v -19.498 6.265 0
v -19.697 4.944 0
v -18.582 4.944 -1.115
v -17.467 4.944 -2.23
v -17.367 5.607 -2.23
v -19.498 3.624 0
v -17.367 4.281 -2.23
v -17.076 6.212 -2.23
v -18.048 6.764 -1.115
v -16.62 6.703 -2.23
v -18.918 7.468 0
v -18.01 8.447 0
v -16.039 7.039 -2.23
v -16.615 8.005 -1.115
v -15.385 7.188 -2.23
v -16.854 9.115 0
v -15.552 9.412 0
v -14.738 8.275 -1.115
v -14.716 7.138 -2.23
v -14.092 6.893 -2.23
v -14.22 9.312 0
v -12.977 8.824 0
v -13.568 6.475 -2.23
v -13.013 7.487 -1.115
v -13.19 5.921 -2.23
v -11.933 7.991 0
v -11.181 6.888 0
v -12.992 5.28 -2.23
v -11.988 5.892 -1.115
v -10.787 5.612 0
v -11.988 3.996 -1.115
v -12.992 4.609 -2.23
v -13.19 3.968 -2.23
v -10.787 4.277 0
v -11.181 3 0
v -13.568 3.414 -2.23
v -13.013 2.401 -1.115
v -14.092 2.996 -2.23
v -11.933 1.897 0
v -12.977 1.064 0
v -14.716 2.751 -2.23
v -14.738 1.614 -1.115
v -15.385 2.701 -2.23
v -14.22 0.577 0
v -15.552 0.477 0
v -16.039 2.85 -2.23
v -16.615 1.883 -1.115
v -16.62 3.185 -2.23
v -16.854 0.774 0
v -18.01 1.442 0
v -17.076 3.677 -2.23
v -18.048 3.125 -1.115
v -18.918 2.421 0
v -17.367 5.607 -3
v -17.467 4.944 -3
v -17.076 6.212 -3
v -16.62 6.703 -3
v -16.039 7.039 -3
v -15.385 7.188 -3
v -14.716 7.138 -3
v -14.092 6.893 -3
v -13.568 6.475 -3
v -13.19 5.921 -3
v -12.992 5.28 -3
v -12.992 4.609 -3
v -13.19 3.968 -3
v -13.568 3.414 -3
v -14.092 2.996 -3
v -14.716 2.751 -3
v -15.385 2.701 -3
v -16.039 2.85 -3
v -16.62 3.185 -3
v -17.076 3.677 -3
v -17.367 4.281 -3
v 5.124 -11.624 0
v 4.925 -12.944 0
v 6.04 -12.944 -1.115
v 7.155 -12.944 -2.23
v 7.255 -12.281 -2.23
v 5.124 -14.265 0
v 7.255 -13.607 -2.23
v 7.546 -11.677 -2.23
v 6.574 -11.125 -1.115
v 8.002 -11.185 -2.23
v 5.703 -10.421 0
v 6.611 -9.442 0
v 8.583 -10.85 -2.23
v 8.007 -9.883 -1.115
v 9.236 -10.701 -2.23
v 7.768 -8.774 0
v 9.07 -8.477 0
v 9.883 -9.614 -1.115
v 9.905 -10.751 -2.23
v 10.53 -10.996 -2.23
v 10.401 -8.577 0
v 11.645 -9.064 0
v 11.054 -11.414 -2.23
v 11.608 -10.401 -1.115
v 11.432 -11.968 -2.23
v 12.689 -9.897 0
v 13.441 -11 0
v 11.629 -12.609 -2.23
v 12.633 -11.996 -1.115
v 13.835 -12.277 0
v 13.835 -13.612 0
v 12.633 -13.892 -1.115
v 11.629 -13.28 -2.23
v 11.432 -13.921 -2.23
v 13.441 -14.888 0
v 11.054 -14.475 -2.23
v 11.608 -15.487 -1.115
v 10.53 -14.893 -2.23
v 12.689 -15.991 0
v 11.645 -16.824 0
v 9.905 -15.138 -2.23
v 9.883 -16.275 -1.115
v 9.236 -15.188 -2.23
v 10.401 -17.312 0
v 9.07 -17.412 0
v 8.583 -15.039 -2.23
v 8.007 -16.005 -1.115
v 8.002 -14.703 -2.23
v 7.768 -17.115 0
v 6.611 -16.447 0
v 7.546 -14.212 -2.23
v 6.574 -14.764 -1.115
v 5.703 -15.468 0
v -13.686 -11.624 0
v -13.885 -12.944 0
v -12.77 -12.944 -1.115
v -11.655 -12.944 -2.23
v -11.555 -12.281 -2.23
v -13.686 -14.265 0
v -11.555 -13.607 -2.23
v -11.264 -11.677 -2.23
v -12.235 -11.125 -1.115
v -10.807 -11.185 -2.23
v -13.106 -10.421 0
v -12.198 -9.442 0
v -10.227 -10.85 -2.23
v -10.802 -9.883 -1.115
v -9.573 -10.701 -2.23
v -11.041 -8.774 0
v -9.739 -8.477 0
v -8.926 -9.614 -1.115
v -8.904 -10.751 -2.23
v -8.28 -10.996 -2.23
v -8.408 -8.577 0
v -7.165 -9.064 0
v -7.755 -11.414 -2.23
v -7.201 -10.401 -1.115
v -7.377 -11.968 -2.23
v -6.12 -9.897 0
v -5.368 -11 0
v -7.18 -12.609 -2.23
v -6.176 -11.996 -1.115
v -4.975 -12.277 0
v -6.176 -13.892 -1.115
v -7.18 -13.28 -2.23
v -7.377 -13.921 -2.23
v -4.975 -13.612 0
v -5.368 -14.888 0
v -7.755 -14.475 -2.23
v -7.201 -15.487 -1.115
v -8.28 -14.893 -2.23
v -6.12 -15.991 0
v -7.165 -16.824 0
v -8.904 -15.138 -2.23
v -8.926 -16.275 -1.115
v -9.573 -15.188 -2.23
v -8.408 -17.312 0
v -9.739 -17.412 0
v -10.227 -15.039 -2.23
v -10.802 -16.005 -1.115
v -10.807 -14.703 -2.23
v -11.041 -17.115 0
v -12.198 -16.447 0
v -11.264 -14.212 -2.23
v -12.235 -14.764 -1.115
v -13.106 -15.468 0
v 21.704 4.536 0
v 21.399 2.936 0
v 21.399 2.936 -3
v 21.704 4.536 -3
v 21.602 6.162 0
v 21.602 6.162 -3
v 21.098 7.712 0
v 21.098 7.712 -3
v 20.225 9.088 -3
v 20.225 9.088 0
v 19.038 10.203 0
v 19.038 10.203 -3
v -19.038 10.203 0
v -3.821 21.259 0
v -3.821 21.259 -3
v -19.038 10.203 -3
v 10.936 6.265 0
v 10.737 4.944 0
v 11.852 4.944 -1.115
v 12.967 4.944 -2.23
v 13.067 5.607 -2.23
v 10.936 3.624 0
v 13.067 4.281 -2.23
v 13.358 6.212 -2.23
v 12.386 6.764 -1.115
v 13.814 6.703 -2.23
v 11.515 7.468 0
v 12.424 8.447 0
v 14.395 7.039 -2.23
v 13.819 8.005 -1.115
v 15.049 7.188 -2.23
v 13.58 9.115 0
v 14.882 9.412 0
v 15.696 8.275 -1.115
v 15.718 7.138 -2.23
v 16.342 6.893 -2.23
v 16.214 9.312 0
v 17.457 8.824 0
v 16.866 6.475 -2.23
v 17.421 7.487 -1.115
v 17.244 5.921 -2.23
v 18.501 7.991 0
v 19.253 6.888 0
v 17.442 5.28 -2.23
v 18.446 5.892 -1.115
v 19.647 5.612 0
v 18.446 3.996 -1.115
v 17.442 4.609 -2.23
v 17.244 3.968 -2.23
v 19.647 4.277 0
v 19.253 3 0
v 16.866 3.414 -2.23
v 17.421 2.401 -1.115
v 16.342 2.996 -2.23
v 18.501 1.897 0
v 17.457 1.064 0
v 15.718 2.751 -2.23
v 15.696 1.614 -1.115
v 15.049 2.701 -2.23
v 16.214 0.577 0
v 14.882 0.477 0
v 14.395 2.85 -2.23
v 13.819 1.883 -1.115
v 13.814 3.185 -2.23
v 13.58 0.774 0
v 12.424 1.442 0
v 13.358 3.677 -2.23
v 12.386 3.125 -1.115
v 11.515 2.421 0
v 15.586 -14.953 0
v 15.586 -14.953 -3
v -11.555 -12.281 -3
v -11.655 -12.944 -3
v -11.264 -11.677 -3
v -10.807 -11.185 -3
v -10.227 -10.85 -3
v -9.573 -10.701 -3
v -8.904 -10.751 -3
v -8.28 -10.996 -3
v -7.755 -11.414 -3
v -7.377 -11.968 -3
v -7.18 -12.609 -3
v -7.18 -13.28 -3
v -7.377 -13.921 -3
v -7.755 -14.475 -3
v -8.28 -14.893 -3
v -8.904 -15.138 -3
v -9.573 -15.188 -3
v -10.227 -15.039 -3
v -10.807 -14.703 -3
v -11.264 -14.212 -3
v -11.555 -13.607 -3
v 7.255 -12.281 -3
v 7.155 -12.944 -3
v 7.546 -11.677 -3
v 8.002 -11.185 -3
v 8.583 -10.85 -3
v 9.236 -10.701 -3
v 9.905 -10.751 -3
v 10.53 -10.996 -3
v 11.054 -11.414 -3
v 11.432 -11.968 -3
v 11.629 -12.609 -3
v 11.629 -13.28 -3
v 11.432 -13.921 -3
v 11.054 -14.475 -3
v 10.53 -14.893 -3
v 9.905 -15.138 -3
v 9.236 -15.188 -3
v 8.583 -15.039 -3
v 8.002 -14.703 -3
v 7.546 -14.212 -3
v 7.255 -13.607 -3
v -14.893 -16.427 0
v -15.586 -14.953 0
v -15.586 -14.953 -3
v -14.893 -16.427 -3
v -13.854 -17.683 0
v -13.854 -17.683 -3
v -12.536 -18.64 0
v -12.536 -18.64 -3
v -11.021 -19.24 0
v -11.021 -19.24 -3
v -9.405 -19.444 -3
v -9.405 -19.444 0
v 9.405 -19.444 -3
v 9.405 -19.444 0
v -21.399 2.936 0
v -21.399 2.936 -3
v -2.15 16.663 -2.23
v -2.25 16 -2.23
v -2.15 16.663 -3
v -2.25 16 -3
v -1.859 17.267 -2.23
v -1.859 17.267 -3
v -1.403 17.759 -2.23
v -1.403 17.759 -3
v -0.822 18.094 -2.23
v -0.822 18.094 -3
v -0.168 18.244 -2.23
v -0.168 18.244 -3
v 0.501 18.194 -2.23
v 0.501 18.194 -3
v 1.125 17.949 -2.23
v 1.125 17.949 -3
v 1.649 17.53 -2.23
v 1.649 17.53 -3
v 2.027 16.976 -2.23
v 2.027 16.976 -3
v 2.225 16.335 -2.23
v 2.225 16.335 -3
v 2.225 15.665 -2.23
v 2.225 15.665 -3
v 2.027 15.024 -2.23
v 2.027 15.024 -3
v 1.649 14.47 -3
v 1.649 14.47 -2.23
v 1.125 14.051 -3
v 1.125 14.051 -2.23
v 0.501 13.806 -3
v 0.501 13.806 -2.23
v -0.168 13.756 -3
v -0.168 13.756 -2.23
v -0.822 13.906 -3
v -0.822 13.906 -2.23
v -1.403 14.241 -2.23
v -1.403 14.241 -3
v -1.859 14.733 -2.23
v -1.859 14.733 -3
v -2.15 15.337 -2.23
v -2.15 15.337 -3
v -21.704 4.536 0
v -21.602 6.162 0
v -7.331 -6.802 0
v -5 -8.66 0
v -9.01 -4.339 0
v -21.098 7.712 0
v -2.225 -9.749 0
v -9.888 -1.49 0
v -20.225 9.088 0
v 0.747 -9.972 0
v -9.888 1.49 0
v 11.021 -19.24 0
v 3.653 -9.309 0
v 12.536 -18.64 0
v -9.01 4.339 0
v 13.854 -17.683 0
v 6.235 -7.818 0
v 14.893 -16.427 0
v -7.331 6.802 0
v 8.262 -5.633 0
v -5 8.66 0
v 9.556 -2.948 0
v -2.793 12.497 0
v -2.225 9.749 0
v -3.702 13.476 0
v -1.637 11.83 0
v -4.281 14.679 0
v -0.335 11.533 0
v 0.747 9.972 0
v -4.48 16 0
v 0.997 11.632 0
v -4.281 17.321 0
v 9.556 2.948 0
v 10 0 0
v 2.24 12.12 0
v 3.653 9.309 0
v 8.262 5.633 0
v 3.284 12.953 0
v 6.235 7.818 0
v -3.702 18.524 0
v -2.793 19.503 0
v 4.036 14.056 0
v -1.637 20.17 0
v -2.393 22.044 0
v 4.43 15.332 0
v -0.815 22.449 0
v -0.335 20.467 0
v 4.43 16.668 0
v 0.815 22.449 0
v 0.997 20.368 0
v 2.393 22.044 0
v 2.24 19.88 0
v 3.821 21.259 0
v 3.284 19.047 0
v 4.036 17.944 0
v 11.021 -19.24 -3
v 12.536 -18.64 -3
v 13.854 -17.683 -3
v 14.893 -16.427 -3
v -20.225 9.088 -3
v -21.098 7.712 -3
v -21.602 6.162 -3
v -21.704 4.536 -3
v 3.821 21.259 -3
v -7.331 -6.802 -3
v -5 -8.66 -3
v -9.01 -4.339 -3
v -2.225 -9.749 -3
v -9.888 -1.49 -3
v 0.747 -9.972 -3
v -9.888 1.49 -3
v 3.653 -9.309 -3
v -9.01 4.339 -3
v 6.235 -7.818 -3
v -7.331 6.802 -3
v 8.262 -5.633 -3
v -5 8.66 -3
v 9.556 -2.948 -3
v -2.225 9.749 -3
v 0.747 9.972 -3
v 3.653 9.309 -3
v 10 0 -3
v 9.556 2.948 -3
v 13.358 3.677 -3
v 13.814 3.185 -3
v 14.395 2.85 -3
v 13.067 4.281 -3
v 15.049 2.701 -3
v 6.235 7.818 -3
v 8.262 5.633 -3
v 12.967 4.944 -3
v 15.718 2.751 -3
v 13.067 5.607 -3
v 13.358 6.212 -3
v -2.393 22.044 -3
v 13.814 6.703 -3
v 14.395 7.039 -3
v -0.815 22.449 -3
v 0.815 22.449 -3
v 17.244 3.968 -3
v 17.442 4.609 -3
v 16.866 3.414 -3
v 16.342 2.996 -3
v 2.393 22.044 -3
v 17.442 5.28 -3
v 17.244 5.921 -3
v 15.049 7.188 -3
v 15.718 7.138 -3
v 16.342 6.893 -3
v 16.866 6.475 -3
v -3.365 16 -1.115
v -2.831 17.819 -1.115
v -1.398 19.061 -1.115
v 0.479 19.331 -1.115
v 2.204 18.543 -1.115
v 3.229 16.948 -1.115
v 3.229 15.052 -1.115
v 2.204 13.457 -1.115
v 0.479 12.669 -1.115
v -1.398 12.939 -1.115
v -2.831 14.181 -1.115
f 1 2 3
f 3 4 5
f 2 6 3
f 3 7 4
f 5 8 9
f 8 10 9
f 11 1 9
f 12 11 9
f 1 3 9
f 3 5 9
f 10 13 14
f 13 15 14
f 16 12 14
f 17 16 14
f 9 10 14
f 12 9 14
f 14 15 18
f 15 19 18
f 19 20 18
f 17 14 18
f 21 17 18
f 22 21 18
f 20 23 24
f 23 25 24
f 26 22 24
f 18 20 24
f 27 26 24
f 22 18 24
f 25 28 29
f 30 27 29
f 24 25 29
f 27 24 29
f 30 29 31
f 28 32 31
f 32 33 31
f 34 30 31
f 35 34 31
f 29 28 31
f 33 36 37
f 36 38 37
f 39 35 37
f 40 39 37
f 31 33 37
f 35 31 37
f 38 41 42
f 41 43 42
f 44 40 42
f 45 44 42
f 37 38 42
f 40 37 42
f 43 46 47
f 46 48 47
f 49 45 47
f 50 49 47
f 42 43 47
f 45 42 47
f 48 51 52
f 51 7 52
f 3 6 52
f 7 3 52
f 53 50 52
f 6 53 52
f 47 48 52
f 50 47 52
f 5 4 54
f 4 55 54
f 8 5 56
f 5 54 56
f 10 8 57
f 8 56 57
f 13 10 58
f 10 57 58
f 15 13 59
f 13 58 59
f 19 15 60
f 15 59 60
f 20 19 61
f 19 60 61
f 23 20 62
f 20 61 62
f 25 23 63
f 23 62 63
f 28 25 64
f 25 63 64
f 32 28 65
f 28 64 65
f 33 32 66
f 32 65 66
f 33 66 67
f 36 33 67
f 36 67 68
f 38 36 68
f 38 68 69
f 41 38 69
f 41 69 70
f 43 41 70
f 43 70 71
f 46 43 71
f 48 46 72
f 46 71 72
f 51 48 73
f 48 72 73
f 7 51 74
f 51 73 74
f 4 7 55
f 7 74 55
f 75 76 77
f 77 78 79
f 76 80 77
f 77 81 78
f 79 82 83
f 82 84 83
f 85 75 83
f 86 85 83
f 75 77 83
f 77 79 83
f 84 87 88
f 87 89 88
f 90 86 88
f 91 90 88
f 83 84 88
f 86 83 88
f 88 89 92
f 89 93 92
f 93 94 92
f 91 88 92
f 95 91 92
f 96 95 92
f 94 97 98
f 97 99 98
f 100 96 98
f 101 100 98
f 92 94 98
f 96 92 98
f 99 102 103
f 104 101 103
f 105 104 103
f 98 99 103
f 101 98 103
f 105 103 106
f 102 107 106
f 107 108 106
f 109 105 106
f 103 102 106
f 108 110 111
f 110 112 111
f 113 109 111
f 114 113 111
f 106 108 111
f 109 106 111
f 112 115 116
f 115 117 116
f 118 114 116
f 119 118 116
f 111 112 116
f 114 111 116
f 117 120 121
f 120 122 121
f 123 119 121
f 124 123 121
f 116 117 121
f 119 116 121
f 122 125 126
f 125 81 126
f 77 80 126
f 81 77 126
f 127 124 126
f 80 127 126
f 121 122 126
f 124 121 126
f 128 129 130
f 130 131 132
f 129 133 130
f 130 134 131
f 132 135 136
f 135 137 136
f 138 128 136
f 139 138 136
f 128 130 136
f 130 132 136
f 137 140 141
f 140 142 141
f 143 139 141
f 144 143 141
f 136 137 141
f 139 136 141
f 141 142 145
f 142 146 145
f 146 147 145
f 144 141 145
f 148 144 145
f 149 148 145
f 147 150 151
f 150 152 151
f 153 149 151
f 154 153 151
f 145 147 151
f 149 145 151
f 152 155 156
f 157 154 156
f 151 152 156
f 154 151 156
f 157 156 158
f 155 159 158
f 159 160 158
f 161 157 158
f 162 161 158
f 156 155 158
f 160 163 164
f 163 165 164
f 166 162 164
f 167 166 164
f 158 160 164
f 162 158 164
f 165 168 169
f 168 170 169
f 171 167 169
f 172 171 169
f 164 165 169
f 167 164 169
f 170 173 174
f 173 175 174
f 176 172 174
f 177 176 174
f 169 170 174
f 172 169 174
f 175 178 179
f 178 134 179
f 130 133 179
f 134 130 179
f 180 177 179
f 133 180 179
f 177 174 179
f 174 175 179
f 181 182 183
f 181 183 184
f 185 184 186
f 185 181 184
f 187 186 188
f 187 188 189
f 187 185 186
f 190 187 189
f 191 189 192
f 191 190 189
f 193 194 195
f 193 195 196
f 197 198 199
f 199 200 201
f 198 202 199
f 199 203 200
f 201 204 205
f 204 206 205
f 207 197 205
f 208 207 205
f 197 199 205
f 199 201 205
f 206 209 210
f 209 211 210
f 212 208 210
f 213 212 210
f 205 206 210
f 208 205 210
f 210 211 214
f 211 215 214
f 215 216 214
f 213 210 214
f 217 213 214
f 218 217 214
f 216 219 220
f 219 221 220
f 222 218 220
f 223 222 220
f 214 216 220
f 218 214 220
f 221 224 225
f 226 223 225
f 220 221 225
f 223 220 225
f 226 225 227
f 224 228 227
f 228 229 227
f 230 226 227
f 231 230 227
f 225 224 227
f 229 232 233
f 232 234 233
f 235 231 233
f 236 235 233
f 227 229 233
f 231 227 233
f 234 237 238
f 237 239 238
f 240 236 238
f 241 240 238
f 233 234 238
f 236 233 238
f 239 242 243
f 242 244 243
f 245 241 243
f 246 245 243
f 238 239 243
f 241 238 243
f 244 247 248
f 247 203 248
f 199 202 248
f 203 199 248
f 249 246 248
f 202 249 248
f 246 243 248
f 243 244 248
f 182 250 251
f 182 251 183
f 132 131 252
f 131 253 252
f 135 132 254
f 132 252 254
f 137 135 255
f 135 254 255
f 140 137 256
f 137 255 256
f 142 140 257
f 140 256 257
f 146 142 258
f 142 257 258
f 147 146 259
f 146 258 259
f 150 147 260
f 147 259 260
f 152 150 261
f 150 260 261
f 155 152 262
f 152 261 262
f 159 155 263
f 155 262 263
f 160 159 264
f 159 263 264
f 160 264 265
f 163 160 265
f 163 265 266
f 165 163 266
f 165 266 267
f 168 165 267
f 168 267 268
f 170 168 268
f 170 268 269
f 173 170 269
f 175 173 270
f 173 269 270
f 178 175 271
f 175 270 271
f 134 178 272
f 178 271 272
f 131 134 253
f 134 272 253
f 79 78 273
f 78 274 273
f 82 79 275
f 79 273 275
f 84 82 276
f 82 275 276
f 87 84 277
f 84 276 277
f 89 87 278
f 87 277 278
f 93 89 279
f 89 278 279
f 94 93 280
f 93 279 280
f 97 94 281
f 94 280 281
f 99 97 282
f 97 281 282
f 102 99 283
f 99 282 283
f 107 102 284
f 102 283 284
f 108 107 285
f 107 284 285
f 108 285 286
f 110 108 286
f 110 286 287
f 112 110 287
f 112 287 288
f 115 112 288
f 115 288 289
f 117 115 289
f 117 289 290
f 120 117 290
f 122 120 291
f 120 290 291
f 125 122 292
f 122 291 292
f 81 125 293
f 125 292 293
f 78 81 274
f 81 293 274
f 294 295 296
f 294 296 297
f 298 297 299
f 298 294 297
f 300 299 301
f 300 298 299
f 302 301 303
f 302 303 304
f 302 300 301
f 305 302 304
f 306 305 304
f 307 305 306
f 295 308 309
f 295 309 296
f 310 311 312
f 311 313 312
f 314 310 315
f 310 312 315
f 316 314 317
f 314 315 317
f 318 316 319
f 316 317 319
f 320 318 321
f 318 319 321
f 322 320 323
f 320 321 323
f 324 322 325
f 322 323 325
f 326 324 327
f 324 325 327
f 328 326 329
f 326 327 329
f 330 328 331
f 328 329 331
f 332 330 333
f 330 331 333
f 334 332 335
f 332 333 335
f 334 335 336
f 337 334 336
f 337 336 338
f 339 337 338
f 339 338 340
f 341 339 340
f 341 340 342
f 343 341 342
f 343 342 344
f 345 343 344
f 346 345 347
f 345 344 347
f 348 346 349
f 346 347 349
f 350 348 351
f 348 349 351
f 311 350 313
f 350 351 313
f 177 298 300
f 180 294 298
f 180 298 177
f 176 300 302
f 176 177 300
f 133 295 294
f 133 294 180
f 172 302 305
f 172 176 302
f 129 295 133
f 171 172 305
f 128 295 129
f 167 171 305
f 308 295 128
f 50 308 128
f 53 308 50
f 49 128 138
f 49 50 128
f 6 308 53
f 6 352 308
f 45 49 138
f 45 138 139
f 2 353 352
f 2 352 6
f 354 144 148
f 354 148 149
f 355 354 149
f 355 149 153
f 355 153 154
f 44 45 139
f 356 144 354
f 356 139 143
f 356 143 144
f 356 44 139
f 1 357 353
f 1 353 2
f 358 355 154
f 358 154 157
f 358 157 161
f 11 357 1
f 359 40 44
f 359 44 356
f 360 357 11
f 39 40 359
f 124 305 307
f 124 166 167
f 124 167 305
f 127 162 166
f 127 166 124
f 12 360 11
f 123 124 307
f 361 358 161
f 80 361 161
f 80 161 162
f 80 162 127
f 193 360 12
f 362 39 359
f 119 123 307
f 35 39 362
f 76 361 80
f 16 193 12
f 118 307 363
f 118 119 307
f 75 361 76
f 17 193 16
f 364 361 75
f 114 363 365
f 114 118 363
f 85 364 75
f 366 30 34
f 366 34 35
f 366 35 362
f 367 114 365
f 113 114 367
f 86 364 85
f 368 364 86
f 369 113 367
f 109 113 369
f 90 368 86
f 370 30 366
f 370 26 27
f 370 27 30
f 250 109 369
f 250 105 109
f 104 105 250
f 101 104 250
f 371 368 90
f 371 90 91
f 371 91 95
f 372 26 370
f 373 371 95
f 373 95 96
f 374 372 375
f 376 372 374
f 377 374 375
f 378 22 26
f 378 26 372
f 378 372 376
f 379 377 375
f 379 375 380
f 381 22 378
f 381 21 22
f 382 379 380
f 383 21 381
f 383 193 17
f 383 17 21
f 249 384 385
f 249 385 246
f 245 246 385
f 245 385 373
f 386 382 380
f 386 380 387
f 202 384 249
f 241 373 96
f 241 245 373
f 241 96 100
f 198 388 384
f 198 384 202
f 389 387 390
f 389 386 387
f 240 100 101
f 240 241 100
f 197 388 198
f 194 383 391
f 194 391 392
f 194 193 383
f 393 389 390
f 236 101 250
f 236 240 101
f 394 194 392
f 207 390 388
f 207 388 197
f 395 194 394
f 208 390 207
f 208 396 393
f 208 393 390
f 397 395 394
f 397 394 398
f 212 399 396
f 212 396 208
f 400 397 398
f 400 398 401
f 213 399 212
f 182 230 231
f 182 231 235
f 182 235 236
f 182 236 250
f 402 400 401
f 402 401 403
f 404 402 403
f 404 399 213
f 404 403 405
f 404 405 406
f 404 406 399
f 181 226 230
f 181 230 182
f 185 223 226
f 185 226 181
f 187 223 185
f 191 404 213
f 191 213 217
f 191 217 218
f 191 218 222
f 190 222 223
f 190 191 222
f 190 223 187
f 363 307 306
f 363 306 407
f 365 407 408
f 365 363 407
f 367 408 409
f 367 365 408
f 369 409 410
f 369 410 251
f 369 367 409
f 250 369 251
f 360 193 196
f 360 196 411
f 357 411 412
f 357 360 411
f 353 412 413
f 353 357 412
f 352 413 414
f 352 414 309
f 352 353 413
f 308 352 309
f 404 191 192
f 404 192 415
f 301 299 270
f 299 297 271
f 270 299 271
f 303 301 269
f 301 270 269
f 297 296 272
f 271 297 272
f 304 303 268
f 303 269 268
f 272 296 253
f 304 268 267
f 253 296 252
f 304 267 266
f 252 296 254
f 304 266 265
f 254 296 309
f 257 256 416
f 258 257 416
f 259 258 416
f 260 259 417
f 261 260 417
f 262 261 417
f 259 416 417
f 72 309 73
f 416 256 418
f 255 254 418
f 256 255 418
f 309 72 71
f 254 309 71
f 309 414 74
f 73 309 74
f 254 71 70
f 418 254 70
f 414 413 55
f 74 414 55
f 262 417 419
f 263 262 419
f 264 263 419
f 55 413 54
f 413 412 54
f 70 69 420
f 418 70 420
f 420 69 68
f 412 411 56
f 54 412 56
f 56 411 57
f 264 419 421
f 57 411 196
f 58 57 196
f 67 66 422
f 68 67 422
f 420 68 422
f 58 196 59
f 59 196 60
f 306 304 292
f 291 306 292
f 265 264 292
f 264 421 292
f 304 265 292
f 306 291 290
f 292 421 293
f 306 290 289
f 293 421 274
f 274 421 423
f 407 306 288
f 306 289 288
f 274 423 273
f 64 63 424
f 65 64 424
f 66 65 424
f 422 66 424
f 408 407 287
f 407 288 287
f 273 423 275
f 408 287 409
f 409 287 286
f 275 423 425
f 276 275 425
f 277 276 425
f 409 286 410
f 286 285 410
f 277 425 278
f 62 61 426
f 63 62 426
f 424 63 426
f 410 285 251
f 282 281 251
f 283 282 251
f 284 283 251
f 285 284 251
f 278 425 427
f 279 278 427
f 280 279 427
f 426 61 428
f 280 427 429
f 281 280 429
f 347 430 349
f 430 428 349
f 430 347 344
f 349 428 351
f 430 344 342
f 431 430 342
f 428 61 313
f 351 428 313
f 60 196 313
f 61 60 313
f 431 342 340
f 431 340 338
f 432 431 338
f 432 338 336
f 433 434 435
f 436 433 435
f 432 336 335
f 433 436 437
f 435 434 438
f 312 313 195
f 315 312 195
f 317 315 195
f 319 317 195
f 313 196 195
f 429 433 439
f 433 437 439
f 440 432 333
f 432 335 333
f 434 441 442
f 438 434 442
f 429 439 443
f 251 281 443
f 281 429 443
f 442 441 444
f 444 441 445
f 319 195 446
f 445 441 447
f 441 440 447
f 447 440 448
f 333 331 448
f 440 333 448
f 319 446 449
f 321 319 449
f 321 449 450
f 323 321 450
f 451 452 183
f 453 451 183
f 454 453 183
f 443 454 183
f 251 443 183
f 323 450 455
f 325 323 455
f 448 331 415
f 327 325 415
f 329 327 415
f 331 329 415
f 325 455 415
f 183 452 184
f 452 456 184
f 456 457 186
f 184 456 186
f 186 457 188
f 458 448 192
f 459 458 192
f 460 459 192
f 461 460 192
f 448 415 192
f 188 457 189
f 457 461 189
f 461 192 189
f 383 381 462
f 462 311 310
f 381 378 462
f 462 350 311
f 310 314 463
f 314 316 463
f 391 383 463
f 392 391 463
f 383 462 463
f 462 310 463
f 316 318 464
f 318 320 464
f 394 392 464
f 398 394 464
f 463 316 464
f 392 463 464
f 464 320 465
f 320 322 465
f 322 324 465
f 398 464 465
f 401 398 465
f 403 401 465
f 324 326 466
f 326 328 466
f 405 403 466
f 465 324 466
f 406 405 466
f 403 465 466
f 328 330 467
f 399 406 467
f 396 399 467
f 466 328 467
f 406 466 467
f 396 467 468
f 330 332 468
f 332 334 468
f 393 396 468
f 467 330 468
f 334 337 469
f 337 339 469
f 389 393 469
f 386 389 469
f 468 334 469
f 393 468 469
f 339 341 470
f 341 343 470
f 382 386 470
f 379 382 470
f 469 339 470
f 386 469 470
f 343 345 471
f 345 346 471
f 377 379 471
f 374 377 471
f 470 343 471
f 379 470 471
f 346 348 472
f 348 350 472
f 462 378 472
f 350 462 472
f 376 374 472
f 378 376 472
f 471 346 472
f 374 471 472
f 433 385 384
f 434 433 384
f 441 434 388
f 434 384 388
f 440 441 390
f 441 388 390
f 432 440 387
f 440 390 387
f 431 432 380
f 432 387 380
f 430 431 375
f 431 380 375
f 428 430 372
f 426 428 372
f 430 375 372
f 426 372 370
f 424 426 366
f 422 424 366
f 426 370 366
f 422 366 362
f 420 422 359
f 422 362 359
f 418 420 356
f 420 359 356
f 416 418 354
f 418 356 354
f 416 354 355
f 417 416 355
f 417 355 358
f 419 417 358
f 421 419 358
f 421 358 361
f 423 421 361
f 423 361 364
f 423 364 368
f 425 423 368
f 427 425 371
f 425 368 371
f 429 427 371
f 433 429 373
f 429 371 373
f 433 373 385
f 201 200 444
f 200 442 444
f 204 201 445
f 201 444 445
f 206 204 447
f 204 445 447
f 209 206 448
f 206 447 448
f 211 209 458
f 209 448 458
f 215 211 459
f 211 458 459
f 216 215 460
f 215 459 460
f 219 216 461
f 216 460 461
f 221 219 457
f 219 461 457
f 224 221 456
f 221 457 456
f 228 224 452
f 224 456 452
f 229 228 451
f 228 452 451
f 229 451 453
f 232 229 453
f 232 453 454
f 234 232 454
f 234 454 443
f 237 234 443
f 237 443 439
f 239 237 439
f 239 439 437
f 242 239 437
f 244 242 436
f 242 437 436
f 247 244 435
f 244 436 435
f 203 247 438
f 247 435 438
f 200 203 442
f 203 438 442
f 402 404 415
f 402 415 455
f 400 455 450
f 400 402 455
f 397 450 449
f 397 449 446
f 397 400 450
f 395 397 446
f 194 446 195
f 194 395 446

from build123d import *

# Parameters (mm, degrees)
SKETCH1_R                     = 10
BOSS_EXTRUDE1_DEPTH           = 3
CSK_FOR_M4_SFHCS1_D           = 4.5
CSK_FOR_M4_SFHCS1_DEPTH       = 5.1
CSK_FOR_M4_SFHCS1_CSINK_D     = 8.96
CSK_FOR_M4_SFHCS1_CSINK_ANGLE = 90
CSK_FOR_M4_SFHCS1_TIP         = 1.351936393


with BuildPart() as part:
    # Sketch1 → Boss-Extrude1 (new body)
    with BuildSketch(Plane.XY):
        with BuildLine():
            Line((-21.398771617, 2.935661447), (-15.586431393, -14.952882373))
            ThreePointArc((-15.586431393, -14.952882373), (-13.225168177, -18.202882373), (-9.404564037, -19.44427191))
            Line((-9.404564037, -19.44427191), (9.404564037, -19.44427191))
            ThreePointArc((9.404564037, -19.44427191), (13.225168177, -18.202882373), (15.586431393, -14.952882373))
            Line((15.586431393, -14.952882373), (21.398771617, 2.935661447))
            ThreePointArc((21.398771617, 2.935661447), (21.398771617, 6.952882373), (19.037508401, 10.202882373))
            Line((19.037508401, 10.202882373), (3.82060414, 21.258610463))
            ThreePointArc((3.82060414, 21.258610463), (0, 22.5), (-3.82060414, 21.258610463))
            Line((-3.82060414, 21.258610463), (-19.037508401, 10.202882373))
            ThreePointArc((-19.037508401, 10.202882373), (-21.398771617, 6.952882373), (-21.398771617, 2.935661447))
        make_face()
        Circle(SKETCH1_R, mode=Mode.SUBTRACT)
    extrude(amount=-BOSS_EXTRUDE1_DEPTH)

    # CSK for M4 SFHCS1
    with Locations(Plane.XY):
        with Locations((0, 16), (15.216904261, 4.94427191), (9.404564037, -12.94427191), (-9.404564037, -12.94427191), (-15.216904261, 4.94427191)):
            CounterSinkHole(CSK_FOR_M4_SFHCS1_D / 2, CSK_FOR_M4_SFHCS1_CSINK_D / 2, depth=CSK_FOR_M4_SFHCS1_DEPTH, counter_sink_angle=CSK_FOR_M4_SFHCS1_CSINK_ANGLE)
            with Locations((0, 0, -(CSK_FOR_M4_SFHCS1_DEPTH + CSK_FOR_M4_SFHCS1_TIP / 2))):  # 118° drill point
                Cone(0, CSK_FOR_M4_SFHCS1_D / 2, CSK_FOR_M4_SFHCS1_TIP, mode=Mode.SUBTRACT)


solid = part.part
